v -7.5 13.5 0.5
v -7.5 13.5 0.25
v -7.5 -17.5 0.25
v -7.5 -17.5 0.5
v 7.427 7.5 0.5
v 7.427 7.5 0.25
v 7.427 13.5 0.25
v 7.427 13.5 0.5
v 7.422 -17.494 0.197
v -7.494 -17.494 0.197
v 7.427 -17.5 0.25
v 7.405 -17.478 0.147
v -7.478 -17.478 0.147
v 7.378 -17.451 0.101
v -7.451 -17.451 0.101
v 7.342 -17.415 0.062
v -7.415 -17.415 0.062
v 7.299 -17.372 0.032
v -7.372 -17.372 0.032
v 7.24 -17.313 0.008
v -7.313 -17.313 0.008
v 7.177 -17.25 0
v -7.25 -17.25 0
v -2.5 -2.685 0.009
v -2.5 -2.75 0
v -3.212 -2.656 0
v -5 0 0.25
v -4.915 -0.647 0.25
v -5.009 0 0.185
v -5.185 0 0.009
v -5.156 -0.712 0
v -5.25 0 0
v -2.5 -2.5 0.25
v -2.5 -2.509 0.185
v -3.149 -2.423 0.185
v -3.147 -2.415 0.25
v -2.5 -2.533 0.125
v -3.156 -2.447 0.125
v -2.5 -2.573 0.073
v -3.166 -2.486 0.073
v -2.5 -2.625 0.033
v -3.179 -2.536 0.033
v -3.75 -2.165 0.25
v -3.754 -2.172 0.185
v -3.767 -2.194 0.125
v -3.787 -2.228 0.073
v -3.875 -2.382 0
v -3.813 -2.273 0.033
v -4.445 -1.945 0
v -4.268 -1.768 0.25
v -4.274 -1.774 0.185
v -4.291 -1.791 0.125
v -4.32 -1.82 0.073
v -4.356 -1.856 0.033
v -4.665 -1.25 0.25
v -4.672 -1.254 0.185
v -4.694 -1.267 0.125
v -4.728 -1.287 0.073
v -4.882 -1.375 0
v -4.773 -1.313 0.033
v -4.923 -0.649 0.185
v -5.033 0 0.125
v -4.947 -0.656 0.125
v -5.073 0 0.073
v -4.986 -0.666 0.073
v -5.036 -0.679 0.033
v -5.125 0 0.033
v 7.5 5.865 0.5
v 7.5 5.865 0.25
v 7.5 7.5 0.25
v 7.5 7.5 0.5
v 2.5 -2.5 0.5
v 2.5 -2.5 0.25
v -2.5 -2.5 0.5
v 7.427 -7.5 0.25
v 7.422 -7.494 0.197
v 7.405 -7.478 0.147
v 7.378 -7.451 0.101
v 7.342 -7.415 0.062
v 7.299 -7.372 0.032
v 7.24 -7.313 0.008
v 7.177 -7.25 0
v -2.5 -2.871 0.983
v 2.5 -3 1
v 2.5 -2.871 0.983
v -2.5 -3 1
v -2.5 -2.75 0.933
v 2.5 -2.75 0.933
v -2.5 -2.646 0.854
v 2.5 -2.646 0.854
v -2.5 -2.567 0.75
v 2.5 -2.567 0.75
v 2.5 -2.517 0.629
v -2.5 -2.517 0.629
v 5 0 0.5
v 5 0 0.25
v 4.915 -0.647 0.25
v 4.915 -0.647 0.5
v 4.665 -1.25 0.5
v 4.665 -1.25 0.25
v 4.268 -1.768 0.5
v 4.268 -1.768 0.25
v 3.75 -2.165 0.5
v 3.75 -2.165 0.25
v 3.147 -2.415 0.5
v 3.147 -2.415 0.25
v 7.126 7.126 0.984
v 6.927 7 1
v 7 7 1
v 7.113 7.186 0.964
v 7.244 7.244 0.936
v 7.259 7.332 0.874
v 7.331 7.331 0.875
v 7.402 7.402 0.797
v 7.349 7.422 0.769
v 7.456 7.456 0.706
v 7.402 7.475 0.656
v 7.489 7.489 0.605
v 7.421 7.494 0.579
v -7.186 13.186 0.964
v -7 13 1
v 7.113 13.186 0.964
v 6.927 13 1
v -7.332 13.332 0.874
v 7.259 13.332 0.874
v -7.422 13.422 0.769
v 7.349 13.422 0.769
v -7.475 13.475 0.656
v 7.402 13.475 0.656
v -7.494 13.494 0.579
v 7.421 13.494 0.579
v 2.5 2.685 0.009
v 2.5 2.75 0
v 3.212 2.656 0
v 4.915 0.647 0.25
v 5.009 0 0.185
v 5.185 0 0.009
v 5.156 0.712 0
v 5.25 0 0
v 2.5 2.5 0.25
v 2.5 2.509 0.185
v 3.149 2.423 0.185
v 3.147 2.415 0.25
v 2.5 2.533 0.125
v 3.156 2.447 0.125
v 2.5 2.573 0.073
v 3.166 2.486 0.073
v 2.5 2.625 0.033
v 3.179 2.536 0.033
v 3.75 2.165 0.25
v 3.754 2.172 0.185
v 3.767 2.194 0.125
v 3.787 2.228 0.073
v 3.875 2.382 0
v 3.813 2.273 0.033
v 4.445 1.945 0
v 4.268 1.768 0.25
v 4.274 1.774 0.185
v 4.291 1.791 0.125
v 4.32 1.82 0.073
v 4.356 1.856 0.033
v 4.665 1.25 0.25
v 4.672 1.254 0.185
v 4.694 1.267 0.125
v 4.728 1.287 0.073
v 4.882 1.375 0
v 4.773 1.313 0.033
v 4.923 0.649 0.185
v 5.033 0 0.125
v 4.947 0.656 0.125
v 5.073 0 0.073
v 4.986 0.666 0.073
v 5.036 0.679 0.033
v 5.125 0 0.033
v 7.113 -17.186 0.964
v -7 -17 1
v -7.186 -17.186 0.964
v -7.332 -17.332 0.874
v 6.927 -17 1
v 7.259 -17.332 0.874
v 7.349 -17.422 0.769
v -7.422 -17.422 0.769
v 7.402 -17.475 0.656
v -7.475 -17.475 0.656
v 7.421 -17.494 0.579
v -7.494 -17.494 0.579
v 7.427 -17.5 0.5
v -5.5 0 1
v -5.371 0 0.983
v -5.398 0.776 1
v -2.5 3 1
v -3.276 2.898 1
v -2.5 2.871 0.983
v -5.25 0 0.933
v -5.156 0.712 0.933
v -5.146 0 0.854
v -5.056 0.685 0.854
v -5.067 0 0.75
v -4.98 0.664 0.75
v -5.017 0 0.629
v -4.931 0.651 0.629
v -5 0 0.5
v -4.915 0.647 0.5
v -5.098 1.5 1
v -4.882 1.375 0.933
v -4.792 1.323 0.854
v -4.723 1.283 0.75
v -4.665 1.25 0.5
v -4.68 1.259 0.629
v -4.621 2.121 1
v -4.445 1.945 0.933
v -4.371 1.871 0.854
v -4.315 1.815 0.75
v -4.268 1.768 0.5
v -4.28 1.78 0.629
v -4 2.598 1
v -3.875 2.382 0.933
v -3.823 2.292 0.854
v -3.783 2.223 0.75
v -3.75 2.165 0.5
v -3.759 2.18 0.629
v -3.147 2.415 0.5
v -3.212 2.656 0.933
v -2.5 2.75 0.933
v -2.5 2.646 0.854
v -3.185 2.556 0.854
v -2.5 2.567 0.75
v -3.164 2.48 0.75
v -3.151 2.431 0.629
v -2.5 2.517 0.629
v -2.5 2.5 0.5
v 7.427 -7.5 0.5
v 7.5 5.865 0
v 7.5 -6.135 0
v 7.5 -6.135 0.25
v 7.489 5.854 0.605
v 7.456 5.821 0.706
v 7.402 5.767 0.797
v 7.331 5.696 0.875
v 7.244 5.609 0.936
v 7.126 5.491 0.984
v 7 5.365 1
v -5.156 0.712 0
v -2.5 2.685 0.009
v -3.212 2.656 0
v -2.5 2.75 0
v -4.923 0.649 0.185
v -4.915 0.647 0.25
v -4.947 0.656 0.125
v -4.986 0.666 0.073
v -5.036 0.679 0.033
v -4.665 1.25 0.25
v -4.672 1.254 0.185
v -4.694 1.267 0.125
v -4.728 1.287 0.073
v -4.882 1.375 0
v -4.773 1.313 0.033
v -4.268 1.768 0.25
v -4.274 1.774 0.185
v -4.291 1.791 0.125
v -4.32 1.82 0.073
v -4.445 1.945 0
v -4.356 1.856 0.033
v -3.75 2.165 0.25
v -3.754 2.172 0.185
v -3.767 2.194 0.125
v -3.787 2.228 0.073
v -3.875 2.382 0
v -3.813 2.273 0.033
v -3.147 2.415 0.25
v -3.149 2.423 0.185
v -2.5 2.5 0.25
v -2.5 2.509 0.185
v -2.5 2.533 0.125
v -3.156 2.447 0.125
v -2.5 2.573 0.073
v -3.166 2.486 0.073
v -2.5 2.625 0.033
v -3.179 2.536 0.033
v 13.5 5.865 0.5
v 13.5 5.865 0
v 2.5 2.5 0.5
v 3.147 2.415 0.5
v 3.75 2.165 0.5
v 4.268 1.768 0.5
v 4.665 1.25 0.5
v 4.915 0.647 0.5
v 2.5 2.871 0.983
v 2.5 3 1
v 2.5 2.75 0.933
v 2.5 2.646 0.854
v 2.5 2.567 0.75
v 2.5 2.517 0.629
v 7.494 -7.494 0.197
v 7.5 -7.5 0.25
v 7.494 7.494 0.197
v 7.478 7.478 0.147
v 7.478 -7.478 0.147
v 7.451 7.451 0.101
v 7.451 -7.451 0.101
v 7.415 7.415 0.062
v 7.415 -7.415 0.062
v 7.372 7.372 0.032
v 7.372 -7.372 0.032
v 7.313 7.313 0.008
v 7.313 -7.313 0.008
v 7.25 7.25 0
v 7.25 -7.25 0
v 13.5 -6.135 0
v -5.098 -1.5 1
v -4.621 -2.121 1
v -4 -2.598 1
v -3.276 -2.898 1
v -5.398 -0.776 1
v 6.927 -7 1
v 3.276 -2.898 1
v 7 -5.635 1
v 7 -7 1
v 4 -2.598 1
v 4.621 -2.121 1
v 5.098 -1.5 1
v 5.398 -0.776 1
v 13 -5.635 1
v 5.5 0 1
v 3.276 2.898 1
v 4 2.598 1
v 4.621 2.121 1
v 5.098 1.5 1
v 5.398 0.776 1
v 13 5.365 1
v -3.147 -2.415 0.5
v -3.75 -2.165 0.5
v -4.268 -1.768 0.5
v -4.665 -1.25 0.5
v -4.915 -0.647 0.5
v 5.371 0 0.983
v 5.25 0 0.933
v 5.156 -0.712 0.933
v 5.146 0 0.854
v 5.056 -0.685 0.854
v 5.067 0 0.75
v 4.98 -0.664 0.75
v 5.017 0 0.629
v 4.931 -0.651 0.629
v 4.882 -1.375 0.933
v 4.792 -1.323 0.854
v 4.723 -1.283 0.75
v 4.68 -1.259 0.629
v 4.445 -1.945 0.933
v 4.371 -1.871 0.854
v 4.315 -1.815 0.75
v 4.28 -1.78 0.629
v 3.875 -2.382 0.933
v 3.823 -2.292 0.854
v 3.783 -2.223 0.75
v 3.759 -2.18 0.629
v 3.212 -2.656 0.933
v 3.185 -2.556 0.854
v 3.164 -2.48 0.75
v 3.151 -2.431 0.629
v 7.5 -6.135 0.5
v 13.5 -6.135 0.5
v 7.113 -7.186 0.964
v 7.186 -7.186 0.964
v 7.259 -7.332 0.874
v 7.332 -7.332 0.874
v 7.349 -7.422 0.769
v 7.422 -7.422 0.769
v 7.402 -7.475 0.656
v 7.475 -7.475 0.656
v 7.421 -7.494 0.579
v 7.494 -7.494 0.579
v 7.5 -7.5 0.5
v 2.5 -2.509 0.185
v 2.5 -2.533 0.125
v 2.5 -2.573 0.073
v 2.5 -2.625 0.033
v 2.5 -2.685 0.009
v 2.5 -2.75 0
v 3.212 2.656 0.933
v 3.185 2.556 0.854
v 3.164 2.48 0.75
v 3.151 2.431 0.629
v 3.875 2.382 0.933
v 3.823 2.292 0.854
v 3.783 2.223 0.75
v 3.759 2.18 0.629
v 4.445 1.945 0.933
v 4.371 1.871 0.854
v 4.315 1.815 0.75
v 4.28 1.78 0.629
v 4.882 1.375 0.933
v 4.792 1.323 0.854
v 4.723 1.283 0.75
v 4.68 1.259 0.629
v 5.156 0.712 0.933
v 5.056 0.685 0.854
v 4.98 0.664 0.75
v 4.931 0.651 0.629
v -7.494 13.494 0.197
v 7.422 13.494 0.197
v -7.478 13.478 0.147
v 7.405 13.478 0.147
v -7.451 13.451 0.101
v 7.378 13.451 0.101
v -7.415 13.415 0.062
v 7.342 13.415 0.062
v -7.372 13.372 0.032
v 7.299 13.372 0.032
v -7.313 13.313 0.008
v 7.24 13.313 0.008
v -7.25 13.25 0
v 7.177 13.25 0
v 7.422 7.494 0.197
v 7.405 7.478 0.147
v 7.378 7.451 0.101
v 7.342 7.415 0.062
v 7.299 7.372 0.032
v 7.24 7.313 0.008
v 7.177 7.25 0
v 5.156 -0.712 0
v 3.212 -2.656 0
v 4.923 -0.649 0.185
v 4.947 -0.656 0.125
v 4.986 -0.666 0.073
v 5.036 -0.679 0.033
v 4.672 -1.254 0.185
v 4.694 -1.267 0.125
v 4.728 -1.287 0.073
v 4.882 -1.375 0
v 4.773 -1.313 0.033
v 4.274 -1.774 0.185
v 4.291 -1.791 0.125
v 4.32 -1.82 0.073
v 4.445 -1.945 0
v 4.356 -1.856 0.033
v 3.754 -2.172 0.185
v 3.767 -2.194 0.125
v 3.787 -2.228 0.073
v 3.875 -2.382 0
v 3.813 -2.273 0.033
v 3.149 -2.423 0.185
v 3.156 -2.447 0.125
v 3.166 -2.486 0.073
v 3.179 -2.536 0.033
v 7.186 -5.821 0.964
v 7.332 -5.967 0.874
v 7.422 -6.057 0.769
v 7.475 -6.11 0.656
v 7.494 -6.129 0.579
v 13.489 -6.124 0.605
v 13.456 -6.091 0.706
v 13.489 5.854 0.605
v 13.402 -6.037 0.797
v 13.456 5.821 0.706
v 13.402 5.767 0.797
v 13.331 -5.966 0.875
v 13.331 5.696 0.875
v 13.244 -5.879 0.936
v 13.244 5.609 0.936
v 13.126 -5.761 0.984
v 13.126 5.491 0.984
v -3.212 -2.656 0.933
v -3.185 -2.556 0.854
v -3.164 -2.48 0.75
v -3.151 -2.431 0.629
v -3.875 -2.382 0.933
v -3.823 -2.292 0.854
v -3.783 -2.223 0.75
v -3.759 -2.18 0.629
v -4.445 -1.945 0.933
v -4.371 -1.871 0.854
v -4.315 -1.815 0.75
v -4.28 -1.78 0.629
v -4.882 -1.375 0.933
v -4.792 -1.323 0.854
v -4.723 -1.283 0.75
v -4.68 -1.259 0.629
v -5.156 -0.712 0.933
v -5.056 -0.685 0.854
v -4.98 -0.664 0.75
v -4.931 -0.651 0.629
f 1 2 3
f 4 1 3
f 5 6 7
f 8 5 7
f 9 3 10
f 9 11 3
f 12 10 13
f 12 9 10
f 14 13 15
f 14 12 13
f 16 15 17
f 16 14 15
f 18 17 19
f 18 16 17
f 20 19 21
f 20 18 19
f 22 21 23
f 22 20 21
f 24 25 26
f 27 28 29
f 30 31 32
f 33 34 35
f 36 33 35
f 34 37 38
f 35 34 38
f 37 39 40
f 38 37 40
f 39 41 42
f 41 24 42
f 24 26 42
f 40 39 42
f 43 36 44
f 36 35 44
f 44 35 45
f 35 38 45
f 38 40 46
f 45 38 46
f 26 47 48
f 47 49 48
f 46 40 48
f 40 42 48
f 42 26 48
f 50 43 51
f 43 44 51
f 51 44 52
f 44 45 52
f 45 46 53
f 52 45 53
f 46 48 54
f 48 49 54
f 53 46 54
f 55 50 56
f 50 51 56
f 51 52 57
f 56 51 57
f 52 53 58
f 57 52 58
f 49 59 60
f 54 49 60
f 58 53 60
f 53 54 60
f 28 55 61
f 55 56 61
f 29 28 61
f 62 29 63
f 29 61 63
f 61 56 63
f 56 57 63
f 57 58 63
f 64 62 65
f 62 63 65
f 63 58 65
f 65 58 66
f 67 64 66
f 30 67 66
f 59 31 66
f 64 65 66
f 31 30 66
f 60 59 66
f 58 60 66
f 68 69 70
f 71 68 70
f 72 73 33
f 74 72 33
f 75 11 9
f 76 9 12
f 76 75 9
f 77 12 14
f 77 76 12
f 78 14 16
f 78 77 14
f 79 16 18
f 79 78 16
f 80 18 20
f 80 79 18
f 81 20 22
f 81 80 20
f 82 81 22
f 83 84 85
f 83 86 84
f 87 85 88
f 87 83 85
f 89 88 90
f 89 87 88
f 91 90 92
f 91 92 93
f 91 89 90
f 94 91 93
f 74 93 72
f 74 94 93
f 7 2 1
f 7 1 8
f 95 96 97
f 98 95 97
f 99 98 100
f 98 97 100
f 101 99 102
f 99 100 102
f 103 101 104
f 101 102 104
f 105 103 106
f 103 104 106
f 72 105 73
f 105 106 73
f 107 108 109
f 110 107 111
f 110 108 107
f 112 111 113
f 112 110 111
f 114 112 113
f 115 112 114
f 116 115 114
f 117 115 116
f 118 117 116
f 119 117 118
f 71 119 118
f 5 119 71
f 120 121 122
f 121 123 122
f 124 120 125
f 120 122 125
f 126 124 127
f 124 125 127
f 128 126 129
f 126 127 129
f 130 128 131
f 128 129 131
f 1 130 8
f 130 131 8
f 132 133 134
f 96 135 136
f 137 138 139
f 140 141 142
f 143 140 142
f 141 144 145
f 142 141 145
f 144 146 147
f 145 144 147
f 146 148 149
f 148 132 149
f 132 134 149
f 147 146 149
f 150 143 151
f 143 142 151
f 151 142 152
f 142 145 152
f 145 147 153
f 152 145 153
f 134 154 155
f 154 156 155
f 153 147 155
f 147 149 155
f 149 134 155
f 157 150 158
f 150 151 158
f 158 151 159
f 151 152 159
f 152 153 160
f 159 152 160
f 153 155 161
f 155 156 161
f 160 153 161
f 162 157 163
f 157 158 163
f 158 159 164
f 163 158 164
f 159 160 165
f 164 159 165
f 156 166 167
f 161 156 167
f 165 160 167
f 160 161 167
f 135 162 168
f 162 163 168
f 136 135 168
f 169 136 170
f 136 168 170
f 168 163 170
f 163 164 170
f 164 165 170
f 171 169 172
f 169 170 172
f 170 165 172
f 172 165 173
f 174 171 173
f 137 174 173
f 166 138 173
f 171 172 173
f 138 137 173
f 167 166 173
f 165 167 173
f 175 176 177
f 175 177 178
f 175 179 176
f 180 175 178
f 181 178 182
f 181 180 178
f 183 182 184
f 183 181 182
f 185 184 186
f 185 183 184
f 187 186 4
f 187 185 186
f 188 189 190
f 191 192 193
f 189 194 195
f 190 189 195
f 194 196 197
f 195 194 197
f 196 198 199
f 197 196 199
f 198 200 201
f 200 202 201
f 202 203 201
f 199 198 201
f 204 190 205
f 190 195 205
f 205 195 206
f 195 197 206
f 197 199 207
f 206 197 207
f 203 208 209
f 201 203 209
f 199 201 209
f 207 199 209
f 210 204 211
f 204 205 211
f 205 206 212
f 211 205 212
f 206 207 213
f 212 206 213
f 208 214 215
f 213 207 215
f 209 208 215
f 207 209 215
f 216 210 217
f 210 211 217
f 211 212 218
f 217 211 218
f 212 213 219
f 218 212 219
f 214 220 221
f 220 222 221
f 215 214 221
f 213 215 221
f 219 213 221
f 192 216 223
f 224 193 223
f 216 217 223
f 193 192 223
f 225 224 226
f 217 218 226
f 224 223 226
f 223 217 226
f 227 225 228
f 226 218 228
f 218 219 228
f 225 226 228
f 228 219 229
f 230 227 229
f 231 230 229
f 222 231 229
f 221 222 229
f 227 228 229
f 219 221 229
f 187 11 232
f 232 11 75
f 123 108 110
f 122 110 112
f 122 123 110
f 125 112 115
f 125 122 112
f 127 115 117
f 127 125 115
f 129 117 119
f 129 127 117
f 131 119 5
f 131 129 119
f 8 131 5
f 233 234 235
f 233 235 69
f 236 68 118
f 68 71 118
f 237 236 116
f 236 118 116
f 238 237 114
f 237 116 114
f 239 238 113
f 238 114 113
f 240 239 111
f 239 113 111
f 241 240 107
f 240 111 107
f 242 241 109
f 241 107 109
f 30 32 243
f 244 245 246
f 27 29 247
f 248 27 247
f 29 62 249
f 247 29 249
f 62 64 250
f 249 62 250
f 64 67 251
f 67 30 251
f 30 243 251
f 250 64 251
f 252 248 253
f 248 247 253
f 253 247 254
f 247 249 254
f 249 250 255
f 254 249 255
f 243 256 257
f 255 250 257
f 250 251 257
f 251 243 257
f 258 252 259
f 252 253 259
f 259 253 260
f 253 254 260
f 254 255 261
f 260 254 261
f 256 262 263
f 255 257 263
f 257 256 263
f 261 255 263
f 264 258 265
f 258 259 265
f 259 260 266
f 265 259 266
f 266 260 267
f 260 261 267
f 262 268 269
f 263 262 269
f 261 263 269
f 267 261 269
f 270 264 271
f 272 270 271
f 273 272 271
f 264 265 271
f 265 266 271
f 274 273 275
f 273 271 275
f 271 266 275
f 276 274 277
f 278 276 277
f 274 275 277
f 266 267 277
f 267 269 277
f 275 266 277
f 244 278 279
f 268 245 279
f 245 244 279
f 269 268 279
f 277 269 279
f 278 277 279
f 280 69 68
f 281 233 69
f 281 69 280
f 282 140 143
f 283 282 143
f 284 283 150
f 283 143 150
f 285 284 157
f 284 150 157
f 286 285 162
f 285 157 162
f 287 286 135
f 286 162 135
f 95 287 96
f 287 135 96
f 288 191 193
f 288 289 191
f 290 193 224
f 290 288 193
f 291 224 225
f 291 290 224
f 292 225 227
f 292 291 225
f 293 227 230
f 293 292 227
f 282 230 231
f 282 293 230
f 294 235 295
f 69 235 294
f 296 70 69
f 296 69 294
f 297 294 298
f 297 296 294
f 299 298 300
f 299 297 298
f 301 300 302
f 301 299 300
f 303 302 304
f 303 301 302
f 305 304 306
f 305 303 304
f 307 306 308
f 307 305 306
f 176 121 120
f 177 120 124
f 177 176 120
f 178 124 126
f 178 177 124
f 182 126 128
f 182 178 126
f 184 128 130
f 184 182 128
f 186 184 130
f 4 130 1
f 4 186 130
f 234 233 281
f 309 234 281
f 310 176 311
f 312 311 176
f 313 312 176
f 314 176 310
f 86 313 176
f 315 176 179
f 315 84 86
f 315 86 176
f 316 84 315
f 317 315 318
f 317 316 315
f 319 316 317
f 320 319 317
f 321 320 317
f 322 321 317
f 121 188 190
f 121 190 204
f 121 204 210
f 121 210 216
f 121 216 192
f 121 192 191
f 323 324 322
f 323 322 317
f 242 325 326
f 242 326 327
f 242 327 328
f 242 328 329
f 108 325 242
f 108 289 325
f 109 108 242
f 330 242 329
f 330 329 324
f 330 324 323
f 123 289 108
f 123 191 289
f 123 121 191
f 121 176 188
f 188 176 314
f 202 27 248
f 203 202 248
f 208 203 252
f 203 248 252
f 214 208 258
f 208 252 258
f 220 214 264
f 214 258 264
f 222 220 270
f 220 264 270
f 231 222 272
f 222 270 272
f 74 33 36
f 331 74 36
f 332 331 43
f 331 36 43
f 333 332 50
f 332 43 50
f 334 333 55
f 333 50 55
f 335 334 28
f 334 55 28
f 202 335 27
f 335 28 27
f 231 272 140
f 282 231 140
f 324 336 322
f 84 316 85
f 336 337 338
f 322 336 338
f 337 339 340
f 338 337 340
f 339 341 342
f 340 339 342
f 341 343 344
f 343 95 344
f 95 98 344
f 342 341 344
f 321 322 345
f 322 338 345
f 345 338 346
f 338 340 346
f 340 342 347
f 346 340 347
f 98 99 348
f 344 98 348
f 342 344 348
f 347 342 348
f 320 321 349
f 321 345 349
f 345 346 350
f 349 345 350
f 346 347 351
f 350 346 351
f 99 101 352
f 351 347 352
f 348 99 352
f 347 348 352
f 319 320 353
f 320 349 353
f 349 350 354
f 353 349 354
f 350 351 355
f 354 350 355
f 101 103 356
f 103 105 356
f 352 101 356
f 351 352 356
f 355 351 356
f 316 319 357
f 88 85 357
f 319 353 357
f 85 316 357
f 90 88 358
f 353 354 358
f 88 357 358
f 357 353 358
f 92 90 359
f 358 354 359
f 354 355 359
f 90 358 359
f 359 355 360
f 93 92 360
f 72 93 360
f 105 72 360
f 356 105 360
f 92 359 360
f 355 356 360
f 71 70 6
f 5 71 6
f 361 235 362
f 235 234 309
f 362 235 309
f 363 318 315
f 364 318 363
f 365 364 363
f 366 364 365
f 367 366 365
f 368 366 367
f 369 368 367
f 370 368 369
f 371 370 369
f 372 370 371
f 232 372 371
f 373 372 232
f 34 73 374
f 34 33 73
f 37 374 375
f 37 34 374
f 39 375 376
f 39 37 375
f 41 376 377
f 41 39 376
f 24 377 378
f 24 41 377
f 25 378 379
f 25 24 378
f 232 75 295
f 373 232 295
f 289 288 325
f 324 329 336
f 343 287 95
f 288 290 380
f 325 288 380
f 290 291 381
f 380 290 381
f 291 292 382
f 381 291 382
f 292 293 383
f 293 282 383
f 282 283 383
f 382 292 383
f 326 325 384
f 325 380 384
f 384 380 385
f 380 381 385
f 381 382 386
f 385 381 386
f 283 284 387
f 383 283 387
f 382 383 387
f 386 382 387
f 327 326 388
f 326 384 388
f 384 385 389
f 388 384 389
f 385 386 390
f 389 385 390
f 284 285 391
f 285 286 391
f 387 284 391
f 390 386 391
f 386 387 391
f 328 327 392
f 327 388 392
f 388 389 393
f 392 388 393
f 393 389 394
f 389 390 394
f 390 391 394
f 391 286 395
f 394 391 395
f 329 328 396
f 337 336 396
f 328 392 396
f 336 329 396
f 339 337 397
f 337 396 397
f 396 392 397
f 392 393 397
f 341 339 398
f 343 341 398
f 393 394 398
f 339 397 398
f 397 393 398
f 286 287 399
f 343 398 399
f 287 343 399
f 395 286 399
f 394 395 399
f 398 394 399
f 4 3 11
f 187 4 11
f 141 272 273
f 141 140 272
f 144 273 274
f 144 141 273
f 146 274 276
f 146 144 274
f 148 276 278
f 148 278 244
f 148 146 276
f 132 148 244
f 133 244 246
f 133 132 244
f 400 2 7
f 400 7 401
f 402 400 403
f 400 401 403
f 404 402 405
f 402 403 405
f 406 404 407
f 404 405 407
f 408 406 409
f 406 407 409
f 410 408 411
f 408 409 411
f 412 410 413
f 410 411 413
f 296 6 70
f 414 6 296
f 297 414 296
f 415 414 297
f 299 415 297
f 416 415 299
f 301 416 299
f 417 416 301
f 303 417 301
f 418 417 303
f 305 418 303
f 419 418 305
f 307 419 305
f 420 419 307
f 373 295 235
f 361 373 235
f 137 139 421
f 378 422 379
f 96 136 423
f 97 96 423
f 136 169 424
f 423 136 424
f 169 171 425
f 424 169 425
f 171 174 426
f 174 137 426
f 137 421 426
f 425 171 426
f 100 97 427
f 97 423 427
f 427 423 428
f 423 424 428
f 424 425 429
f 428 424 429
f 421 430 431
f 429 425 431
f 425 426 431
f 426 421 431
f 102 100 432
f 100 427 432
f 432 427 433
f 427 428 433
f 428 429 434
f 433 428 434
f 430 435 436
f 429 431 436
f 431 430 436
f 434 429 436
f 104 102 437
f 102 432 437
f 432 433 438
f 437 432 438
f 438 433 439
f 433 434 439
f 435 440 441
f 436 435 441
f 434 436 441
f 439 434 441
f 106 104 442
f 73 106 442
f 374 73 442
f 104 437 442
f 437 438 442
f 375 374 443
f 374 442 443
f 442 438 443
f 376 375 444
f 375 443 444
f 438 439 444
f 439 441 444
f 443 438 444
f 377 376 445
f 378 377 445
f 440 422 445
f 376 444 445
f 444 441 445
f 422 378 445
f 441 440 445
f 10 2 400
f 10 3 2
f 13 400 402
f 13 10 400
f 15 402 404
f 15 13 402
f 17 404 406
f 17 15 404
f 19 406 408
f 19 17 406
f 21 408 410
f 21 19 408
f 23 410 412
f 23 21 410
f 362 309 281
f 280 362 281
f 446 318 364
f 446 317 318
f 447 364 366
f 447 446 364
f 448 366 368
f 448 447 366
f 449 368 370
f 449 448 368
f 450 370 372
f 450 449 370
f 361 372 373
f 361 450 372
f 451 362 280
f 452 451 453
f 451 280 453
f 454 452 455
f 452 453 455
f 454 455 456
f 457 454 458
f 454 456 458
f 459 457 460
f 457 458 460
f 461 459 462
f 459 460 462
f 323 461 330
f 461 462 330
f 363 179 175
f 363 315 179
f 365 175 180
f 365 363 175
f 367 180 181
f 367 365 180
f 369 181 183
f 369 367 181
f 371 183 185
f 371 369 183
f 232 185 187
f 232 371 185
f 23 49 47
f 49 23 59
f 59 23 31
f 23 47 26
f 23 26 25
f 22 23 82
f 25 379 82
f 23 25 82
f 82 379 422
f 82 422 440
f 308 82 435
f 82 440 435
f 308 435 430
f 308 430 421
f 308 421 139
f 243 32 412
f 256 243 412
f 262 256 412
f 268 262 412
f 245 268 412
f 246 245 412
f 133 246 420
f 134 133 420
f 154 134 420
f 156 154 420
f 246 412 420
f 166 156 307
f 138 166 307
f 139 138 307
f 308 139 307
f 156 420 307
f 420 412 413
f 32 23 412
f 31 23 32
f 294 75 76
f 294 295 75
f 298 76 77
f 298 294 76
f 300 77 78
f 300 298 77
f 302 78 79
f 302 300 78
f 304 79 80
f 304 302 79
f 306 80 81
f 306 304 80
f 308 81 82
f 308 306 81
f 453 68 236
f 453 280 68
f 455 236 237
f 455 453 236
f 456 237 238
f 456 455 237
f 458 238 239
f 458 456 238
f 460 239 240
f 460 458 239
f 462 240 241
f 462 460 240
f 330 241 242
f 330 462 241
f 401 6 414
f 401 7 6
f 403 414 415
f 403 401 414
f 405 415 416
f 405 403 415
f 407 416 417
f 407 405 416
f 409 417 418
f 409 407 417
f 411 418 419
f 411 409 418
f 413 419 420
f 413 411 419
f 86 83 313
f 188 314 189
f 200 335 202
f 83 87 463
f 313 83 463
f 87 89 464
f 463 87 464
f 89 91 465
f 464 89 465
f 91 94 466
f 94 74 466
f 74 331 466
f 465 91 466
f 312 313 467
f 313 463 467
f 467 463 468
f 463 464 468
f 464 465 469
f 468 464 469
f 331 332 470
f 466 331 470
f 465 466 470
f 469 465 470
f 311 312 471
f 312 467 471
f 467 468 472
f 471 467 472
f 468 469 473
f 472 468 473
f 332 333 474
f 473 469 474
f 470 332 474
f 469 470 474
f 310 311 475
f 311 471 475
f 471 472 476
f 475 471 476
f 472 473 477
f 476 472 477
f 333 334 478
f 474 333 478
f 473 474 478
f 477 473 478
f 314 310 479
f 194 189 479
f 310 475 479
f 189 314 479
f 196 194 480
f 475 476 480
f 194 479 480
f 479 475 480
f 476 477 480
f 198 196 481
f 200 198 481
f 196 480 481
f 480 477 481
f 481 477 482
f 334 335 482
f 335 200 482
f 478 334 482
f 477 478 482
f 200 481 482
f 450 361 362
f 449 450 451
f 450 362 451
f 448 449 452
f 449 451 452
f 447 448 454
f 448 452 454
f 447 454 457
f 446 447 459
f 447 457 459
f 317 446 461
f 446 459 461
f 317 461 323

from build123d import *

# Parameters (mm, degrees)
F0_W     = 14.9271550402
F0_H     = 6
F0_H_2   = 10
F1_DEPTH = 1
F2_R     = 0.25
F3_DEPTH = 1
F0_W_2   = 6
F0_H_3   = 12
F4_DEPTH = 1
F5_R     = 0.5


# Not quite as in the source:
# - a feature names something its author has since deleted; it is built from what else it names


with BuildPart() as f1:
    # F0 (on Top) → F1 (new body)
    with BuildSketch(Plane.XY):
        with Locations((-0.0364224799, 10.5)):
            Rectangle(F0_W, F0_H)
        Polygon((7.4271550402, 7.5), (-7.5, 7.5), (-7.5, -7.5), (7.4271550402, -7.5), (7.5, -7.5), (7.5, -6.1350027099), (7.5, 5.8649972901), (7.5, 7.5), align=None)
        with BuildLine():
            ThreePointArc((-5, 0), (-4.267766953, 1.767766953), (-2.5, 2.5))
            Line((-2.5, 2.5), (2.5, 2.5))
            ThreePointArc((2.5, 2.5), (4.267766953, 1.767766953), (5, 0))
            ThreePointArc((5, 0), (4.267766953, -1.767766953), (2.5, -2.5))
            Line((2.5, -2.5), (-2.5, -2.5))
            ThreePointArc((-2.5, -2.5), (-4.267766953, -1.767766953), (-5, 0))
        make_face(mode=Mode.SUBTRACT)
        with Locations((-0.0364224799, -12.5)):
            Rectangle(F0_W, F0_H_2)
    extrude(amount=F1_DEPTH)

    # F2
    f2_edges = [f1.edges().sort_by_distance(p)[0] for p in [
        (-0.036422, 13.5, 0),
        (-7.5, -2, 0),
        (-0.036422, -17.5, 0),
        (7.427155, -12.5, 0),
        (7.463578, -7.5, 0),
        (7.5, 0, 0),
        (7.463578, 7.5, 0),
        (7.427155, 10.5, 0),
        (-5, 0, 0),
        (0, 2.5, 0),
        (5, 0, 0),
        (0, -2.5, 0),
    ]]
    fillet(f2_edges, radius=F2_R)

    # F0 (on Top) → F3 (cut)
    with BuildSketch(Plane.XY):
        with BuildLine():
            Line((2.5, 2.5), (-2.5, 2.5))
            ThreePointArc((-2.5, 2.5), (-4.267766953, 1.767766953), (-5, 0))
            ThreePointArc((-5, 0), (-4.267766953, -1.767766953), (-2.5, -2.5))
            Line((-2.5, -2.5), (2.5, -2.5))
            ThreePointArc((2.5, -2.5), (4.267766953, -1.767766953), (5, 0))
            ThreePointArc((5, 0), (4.267766953, 1.767766953), (2.5, 2.5))
        make_face()
    extrude(amount=F3_DEPTH, mode=Mode.SUBTRACT)

    # F0 (on Top) → F4 (join)
    with BuildSketch(Plane.XY):
        with Locations((10.5, -0.1350027099)):
            Rectangle(F0_W_2, F0_H_3)
    extrude(amount=F4_DEPTH)

    # F5
    f5_edges = [f1.edges().sort_by_distance(p)[0] for p in [
        (-0.036422, 13.5, 1),
        (-7.5, -2, 1),
        (-0.036422, -17.5, 1),
        (7.427155, -12.5, 1),
        (7.463578, -7.5, 1),
        (7.5, -6.817501, 1),
        (10.5, -6.135003, 1),
        (13.5, -0.135003, 1),
        (10.5, 5.864997, 1),
        (7.5, 6.682499, 1),
        (7.463578, 7.5, 1),
        (7.427155, 10.5, 1),
        (-5, 0, 1),
        (0, 2.5, 1),
        (5, 0, 1),
        (0, -2.5, 1),
    ]]
    fillet(f5_edges, radius=F5_R)


solid = f1.part
